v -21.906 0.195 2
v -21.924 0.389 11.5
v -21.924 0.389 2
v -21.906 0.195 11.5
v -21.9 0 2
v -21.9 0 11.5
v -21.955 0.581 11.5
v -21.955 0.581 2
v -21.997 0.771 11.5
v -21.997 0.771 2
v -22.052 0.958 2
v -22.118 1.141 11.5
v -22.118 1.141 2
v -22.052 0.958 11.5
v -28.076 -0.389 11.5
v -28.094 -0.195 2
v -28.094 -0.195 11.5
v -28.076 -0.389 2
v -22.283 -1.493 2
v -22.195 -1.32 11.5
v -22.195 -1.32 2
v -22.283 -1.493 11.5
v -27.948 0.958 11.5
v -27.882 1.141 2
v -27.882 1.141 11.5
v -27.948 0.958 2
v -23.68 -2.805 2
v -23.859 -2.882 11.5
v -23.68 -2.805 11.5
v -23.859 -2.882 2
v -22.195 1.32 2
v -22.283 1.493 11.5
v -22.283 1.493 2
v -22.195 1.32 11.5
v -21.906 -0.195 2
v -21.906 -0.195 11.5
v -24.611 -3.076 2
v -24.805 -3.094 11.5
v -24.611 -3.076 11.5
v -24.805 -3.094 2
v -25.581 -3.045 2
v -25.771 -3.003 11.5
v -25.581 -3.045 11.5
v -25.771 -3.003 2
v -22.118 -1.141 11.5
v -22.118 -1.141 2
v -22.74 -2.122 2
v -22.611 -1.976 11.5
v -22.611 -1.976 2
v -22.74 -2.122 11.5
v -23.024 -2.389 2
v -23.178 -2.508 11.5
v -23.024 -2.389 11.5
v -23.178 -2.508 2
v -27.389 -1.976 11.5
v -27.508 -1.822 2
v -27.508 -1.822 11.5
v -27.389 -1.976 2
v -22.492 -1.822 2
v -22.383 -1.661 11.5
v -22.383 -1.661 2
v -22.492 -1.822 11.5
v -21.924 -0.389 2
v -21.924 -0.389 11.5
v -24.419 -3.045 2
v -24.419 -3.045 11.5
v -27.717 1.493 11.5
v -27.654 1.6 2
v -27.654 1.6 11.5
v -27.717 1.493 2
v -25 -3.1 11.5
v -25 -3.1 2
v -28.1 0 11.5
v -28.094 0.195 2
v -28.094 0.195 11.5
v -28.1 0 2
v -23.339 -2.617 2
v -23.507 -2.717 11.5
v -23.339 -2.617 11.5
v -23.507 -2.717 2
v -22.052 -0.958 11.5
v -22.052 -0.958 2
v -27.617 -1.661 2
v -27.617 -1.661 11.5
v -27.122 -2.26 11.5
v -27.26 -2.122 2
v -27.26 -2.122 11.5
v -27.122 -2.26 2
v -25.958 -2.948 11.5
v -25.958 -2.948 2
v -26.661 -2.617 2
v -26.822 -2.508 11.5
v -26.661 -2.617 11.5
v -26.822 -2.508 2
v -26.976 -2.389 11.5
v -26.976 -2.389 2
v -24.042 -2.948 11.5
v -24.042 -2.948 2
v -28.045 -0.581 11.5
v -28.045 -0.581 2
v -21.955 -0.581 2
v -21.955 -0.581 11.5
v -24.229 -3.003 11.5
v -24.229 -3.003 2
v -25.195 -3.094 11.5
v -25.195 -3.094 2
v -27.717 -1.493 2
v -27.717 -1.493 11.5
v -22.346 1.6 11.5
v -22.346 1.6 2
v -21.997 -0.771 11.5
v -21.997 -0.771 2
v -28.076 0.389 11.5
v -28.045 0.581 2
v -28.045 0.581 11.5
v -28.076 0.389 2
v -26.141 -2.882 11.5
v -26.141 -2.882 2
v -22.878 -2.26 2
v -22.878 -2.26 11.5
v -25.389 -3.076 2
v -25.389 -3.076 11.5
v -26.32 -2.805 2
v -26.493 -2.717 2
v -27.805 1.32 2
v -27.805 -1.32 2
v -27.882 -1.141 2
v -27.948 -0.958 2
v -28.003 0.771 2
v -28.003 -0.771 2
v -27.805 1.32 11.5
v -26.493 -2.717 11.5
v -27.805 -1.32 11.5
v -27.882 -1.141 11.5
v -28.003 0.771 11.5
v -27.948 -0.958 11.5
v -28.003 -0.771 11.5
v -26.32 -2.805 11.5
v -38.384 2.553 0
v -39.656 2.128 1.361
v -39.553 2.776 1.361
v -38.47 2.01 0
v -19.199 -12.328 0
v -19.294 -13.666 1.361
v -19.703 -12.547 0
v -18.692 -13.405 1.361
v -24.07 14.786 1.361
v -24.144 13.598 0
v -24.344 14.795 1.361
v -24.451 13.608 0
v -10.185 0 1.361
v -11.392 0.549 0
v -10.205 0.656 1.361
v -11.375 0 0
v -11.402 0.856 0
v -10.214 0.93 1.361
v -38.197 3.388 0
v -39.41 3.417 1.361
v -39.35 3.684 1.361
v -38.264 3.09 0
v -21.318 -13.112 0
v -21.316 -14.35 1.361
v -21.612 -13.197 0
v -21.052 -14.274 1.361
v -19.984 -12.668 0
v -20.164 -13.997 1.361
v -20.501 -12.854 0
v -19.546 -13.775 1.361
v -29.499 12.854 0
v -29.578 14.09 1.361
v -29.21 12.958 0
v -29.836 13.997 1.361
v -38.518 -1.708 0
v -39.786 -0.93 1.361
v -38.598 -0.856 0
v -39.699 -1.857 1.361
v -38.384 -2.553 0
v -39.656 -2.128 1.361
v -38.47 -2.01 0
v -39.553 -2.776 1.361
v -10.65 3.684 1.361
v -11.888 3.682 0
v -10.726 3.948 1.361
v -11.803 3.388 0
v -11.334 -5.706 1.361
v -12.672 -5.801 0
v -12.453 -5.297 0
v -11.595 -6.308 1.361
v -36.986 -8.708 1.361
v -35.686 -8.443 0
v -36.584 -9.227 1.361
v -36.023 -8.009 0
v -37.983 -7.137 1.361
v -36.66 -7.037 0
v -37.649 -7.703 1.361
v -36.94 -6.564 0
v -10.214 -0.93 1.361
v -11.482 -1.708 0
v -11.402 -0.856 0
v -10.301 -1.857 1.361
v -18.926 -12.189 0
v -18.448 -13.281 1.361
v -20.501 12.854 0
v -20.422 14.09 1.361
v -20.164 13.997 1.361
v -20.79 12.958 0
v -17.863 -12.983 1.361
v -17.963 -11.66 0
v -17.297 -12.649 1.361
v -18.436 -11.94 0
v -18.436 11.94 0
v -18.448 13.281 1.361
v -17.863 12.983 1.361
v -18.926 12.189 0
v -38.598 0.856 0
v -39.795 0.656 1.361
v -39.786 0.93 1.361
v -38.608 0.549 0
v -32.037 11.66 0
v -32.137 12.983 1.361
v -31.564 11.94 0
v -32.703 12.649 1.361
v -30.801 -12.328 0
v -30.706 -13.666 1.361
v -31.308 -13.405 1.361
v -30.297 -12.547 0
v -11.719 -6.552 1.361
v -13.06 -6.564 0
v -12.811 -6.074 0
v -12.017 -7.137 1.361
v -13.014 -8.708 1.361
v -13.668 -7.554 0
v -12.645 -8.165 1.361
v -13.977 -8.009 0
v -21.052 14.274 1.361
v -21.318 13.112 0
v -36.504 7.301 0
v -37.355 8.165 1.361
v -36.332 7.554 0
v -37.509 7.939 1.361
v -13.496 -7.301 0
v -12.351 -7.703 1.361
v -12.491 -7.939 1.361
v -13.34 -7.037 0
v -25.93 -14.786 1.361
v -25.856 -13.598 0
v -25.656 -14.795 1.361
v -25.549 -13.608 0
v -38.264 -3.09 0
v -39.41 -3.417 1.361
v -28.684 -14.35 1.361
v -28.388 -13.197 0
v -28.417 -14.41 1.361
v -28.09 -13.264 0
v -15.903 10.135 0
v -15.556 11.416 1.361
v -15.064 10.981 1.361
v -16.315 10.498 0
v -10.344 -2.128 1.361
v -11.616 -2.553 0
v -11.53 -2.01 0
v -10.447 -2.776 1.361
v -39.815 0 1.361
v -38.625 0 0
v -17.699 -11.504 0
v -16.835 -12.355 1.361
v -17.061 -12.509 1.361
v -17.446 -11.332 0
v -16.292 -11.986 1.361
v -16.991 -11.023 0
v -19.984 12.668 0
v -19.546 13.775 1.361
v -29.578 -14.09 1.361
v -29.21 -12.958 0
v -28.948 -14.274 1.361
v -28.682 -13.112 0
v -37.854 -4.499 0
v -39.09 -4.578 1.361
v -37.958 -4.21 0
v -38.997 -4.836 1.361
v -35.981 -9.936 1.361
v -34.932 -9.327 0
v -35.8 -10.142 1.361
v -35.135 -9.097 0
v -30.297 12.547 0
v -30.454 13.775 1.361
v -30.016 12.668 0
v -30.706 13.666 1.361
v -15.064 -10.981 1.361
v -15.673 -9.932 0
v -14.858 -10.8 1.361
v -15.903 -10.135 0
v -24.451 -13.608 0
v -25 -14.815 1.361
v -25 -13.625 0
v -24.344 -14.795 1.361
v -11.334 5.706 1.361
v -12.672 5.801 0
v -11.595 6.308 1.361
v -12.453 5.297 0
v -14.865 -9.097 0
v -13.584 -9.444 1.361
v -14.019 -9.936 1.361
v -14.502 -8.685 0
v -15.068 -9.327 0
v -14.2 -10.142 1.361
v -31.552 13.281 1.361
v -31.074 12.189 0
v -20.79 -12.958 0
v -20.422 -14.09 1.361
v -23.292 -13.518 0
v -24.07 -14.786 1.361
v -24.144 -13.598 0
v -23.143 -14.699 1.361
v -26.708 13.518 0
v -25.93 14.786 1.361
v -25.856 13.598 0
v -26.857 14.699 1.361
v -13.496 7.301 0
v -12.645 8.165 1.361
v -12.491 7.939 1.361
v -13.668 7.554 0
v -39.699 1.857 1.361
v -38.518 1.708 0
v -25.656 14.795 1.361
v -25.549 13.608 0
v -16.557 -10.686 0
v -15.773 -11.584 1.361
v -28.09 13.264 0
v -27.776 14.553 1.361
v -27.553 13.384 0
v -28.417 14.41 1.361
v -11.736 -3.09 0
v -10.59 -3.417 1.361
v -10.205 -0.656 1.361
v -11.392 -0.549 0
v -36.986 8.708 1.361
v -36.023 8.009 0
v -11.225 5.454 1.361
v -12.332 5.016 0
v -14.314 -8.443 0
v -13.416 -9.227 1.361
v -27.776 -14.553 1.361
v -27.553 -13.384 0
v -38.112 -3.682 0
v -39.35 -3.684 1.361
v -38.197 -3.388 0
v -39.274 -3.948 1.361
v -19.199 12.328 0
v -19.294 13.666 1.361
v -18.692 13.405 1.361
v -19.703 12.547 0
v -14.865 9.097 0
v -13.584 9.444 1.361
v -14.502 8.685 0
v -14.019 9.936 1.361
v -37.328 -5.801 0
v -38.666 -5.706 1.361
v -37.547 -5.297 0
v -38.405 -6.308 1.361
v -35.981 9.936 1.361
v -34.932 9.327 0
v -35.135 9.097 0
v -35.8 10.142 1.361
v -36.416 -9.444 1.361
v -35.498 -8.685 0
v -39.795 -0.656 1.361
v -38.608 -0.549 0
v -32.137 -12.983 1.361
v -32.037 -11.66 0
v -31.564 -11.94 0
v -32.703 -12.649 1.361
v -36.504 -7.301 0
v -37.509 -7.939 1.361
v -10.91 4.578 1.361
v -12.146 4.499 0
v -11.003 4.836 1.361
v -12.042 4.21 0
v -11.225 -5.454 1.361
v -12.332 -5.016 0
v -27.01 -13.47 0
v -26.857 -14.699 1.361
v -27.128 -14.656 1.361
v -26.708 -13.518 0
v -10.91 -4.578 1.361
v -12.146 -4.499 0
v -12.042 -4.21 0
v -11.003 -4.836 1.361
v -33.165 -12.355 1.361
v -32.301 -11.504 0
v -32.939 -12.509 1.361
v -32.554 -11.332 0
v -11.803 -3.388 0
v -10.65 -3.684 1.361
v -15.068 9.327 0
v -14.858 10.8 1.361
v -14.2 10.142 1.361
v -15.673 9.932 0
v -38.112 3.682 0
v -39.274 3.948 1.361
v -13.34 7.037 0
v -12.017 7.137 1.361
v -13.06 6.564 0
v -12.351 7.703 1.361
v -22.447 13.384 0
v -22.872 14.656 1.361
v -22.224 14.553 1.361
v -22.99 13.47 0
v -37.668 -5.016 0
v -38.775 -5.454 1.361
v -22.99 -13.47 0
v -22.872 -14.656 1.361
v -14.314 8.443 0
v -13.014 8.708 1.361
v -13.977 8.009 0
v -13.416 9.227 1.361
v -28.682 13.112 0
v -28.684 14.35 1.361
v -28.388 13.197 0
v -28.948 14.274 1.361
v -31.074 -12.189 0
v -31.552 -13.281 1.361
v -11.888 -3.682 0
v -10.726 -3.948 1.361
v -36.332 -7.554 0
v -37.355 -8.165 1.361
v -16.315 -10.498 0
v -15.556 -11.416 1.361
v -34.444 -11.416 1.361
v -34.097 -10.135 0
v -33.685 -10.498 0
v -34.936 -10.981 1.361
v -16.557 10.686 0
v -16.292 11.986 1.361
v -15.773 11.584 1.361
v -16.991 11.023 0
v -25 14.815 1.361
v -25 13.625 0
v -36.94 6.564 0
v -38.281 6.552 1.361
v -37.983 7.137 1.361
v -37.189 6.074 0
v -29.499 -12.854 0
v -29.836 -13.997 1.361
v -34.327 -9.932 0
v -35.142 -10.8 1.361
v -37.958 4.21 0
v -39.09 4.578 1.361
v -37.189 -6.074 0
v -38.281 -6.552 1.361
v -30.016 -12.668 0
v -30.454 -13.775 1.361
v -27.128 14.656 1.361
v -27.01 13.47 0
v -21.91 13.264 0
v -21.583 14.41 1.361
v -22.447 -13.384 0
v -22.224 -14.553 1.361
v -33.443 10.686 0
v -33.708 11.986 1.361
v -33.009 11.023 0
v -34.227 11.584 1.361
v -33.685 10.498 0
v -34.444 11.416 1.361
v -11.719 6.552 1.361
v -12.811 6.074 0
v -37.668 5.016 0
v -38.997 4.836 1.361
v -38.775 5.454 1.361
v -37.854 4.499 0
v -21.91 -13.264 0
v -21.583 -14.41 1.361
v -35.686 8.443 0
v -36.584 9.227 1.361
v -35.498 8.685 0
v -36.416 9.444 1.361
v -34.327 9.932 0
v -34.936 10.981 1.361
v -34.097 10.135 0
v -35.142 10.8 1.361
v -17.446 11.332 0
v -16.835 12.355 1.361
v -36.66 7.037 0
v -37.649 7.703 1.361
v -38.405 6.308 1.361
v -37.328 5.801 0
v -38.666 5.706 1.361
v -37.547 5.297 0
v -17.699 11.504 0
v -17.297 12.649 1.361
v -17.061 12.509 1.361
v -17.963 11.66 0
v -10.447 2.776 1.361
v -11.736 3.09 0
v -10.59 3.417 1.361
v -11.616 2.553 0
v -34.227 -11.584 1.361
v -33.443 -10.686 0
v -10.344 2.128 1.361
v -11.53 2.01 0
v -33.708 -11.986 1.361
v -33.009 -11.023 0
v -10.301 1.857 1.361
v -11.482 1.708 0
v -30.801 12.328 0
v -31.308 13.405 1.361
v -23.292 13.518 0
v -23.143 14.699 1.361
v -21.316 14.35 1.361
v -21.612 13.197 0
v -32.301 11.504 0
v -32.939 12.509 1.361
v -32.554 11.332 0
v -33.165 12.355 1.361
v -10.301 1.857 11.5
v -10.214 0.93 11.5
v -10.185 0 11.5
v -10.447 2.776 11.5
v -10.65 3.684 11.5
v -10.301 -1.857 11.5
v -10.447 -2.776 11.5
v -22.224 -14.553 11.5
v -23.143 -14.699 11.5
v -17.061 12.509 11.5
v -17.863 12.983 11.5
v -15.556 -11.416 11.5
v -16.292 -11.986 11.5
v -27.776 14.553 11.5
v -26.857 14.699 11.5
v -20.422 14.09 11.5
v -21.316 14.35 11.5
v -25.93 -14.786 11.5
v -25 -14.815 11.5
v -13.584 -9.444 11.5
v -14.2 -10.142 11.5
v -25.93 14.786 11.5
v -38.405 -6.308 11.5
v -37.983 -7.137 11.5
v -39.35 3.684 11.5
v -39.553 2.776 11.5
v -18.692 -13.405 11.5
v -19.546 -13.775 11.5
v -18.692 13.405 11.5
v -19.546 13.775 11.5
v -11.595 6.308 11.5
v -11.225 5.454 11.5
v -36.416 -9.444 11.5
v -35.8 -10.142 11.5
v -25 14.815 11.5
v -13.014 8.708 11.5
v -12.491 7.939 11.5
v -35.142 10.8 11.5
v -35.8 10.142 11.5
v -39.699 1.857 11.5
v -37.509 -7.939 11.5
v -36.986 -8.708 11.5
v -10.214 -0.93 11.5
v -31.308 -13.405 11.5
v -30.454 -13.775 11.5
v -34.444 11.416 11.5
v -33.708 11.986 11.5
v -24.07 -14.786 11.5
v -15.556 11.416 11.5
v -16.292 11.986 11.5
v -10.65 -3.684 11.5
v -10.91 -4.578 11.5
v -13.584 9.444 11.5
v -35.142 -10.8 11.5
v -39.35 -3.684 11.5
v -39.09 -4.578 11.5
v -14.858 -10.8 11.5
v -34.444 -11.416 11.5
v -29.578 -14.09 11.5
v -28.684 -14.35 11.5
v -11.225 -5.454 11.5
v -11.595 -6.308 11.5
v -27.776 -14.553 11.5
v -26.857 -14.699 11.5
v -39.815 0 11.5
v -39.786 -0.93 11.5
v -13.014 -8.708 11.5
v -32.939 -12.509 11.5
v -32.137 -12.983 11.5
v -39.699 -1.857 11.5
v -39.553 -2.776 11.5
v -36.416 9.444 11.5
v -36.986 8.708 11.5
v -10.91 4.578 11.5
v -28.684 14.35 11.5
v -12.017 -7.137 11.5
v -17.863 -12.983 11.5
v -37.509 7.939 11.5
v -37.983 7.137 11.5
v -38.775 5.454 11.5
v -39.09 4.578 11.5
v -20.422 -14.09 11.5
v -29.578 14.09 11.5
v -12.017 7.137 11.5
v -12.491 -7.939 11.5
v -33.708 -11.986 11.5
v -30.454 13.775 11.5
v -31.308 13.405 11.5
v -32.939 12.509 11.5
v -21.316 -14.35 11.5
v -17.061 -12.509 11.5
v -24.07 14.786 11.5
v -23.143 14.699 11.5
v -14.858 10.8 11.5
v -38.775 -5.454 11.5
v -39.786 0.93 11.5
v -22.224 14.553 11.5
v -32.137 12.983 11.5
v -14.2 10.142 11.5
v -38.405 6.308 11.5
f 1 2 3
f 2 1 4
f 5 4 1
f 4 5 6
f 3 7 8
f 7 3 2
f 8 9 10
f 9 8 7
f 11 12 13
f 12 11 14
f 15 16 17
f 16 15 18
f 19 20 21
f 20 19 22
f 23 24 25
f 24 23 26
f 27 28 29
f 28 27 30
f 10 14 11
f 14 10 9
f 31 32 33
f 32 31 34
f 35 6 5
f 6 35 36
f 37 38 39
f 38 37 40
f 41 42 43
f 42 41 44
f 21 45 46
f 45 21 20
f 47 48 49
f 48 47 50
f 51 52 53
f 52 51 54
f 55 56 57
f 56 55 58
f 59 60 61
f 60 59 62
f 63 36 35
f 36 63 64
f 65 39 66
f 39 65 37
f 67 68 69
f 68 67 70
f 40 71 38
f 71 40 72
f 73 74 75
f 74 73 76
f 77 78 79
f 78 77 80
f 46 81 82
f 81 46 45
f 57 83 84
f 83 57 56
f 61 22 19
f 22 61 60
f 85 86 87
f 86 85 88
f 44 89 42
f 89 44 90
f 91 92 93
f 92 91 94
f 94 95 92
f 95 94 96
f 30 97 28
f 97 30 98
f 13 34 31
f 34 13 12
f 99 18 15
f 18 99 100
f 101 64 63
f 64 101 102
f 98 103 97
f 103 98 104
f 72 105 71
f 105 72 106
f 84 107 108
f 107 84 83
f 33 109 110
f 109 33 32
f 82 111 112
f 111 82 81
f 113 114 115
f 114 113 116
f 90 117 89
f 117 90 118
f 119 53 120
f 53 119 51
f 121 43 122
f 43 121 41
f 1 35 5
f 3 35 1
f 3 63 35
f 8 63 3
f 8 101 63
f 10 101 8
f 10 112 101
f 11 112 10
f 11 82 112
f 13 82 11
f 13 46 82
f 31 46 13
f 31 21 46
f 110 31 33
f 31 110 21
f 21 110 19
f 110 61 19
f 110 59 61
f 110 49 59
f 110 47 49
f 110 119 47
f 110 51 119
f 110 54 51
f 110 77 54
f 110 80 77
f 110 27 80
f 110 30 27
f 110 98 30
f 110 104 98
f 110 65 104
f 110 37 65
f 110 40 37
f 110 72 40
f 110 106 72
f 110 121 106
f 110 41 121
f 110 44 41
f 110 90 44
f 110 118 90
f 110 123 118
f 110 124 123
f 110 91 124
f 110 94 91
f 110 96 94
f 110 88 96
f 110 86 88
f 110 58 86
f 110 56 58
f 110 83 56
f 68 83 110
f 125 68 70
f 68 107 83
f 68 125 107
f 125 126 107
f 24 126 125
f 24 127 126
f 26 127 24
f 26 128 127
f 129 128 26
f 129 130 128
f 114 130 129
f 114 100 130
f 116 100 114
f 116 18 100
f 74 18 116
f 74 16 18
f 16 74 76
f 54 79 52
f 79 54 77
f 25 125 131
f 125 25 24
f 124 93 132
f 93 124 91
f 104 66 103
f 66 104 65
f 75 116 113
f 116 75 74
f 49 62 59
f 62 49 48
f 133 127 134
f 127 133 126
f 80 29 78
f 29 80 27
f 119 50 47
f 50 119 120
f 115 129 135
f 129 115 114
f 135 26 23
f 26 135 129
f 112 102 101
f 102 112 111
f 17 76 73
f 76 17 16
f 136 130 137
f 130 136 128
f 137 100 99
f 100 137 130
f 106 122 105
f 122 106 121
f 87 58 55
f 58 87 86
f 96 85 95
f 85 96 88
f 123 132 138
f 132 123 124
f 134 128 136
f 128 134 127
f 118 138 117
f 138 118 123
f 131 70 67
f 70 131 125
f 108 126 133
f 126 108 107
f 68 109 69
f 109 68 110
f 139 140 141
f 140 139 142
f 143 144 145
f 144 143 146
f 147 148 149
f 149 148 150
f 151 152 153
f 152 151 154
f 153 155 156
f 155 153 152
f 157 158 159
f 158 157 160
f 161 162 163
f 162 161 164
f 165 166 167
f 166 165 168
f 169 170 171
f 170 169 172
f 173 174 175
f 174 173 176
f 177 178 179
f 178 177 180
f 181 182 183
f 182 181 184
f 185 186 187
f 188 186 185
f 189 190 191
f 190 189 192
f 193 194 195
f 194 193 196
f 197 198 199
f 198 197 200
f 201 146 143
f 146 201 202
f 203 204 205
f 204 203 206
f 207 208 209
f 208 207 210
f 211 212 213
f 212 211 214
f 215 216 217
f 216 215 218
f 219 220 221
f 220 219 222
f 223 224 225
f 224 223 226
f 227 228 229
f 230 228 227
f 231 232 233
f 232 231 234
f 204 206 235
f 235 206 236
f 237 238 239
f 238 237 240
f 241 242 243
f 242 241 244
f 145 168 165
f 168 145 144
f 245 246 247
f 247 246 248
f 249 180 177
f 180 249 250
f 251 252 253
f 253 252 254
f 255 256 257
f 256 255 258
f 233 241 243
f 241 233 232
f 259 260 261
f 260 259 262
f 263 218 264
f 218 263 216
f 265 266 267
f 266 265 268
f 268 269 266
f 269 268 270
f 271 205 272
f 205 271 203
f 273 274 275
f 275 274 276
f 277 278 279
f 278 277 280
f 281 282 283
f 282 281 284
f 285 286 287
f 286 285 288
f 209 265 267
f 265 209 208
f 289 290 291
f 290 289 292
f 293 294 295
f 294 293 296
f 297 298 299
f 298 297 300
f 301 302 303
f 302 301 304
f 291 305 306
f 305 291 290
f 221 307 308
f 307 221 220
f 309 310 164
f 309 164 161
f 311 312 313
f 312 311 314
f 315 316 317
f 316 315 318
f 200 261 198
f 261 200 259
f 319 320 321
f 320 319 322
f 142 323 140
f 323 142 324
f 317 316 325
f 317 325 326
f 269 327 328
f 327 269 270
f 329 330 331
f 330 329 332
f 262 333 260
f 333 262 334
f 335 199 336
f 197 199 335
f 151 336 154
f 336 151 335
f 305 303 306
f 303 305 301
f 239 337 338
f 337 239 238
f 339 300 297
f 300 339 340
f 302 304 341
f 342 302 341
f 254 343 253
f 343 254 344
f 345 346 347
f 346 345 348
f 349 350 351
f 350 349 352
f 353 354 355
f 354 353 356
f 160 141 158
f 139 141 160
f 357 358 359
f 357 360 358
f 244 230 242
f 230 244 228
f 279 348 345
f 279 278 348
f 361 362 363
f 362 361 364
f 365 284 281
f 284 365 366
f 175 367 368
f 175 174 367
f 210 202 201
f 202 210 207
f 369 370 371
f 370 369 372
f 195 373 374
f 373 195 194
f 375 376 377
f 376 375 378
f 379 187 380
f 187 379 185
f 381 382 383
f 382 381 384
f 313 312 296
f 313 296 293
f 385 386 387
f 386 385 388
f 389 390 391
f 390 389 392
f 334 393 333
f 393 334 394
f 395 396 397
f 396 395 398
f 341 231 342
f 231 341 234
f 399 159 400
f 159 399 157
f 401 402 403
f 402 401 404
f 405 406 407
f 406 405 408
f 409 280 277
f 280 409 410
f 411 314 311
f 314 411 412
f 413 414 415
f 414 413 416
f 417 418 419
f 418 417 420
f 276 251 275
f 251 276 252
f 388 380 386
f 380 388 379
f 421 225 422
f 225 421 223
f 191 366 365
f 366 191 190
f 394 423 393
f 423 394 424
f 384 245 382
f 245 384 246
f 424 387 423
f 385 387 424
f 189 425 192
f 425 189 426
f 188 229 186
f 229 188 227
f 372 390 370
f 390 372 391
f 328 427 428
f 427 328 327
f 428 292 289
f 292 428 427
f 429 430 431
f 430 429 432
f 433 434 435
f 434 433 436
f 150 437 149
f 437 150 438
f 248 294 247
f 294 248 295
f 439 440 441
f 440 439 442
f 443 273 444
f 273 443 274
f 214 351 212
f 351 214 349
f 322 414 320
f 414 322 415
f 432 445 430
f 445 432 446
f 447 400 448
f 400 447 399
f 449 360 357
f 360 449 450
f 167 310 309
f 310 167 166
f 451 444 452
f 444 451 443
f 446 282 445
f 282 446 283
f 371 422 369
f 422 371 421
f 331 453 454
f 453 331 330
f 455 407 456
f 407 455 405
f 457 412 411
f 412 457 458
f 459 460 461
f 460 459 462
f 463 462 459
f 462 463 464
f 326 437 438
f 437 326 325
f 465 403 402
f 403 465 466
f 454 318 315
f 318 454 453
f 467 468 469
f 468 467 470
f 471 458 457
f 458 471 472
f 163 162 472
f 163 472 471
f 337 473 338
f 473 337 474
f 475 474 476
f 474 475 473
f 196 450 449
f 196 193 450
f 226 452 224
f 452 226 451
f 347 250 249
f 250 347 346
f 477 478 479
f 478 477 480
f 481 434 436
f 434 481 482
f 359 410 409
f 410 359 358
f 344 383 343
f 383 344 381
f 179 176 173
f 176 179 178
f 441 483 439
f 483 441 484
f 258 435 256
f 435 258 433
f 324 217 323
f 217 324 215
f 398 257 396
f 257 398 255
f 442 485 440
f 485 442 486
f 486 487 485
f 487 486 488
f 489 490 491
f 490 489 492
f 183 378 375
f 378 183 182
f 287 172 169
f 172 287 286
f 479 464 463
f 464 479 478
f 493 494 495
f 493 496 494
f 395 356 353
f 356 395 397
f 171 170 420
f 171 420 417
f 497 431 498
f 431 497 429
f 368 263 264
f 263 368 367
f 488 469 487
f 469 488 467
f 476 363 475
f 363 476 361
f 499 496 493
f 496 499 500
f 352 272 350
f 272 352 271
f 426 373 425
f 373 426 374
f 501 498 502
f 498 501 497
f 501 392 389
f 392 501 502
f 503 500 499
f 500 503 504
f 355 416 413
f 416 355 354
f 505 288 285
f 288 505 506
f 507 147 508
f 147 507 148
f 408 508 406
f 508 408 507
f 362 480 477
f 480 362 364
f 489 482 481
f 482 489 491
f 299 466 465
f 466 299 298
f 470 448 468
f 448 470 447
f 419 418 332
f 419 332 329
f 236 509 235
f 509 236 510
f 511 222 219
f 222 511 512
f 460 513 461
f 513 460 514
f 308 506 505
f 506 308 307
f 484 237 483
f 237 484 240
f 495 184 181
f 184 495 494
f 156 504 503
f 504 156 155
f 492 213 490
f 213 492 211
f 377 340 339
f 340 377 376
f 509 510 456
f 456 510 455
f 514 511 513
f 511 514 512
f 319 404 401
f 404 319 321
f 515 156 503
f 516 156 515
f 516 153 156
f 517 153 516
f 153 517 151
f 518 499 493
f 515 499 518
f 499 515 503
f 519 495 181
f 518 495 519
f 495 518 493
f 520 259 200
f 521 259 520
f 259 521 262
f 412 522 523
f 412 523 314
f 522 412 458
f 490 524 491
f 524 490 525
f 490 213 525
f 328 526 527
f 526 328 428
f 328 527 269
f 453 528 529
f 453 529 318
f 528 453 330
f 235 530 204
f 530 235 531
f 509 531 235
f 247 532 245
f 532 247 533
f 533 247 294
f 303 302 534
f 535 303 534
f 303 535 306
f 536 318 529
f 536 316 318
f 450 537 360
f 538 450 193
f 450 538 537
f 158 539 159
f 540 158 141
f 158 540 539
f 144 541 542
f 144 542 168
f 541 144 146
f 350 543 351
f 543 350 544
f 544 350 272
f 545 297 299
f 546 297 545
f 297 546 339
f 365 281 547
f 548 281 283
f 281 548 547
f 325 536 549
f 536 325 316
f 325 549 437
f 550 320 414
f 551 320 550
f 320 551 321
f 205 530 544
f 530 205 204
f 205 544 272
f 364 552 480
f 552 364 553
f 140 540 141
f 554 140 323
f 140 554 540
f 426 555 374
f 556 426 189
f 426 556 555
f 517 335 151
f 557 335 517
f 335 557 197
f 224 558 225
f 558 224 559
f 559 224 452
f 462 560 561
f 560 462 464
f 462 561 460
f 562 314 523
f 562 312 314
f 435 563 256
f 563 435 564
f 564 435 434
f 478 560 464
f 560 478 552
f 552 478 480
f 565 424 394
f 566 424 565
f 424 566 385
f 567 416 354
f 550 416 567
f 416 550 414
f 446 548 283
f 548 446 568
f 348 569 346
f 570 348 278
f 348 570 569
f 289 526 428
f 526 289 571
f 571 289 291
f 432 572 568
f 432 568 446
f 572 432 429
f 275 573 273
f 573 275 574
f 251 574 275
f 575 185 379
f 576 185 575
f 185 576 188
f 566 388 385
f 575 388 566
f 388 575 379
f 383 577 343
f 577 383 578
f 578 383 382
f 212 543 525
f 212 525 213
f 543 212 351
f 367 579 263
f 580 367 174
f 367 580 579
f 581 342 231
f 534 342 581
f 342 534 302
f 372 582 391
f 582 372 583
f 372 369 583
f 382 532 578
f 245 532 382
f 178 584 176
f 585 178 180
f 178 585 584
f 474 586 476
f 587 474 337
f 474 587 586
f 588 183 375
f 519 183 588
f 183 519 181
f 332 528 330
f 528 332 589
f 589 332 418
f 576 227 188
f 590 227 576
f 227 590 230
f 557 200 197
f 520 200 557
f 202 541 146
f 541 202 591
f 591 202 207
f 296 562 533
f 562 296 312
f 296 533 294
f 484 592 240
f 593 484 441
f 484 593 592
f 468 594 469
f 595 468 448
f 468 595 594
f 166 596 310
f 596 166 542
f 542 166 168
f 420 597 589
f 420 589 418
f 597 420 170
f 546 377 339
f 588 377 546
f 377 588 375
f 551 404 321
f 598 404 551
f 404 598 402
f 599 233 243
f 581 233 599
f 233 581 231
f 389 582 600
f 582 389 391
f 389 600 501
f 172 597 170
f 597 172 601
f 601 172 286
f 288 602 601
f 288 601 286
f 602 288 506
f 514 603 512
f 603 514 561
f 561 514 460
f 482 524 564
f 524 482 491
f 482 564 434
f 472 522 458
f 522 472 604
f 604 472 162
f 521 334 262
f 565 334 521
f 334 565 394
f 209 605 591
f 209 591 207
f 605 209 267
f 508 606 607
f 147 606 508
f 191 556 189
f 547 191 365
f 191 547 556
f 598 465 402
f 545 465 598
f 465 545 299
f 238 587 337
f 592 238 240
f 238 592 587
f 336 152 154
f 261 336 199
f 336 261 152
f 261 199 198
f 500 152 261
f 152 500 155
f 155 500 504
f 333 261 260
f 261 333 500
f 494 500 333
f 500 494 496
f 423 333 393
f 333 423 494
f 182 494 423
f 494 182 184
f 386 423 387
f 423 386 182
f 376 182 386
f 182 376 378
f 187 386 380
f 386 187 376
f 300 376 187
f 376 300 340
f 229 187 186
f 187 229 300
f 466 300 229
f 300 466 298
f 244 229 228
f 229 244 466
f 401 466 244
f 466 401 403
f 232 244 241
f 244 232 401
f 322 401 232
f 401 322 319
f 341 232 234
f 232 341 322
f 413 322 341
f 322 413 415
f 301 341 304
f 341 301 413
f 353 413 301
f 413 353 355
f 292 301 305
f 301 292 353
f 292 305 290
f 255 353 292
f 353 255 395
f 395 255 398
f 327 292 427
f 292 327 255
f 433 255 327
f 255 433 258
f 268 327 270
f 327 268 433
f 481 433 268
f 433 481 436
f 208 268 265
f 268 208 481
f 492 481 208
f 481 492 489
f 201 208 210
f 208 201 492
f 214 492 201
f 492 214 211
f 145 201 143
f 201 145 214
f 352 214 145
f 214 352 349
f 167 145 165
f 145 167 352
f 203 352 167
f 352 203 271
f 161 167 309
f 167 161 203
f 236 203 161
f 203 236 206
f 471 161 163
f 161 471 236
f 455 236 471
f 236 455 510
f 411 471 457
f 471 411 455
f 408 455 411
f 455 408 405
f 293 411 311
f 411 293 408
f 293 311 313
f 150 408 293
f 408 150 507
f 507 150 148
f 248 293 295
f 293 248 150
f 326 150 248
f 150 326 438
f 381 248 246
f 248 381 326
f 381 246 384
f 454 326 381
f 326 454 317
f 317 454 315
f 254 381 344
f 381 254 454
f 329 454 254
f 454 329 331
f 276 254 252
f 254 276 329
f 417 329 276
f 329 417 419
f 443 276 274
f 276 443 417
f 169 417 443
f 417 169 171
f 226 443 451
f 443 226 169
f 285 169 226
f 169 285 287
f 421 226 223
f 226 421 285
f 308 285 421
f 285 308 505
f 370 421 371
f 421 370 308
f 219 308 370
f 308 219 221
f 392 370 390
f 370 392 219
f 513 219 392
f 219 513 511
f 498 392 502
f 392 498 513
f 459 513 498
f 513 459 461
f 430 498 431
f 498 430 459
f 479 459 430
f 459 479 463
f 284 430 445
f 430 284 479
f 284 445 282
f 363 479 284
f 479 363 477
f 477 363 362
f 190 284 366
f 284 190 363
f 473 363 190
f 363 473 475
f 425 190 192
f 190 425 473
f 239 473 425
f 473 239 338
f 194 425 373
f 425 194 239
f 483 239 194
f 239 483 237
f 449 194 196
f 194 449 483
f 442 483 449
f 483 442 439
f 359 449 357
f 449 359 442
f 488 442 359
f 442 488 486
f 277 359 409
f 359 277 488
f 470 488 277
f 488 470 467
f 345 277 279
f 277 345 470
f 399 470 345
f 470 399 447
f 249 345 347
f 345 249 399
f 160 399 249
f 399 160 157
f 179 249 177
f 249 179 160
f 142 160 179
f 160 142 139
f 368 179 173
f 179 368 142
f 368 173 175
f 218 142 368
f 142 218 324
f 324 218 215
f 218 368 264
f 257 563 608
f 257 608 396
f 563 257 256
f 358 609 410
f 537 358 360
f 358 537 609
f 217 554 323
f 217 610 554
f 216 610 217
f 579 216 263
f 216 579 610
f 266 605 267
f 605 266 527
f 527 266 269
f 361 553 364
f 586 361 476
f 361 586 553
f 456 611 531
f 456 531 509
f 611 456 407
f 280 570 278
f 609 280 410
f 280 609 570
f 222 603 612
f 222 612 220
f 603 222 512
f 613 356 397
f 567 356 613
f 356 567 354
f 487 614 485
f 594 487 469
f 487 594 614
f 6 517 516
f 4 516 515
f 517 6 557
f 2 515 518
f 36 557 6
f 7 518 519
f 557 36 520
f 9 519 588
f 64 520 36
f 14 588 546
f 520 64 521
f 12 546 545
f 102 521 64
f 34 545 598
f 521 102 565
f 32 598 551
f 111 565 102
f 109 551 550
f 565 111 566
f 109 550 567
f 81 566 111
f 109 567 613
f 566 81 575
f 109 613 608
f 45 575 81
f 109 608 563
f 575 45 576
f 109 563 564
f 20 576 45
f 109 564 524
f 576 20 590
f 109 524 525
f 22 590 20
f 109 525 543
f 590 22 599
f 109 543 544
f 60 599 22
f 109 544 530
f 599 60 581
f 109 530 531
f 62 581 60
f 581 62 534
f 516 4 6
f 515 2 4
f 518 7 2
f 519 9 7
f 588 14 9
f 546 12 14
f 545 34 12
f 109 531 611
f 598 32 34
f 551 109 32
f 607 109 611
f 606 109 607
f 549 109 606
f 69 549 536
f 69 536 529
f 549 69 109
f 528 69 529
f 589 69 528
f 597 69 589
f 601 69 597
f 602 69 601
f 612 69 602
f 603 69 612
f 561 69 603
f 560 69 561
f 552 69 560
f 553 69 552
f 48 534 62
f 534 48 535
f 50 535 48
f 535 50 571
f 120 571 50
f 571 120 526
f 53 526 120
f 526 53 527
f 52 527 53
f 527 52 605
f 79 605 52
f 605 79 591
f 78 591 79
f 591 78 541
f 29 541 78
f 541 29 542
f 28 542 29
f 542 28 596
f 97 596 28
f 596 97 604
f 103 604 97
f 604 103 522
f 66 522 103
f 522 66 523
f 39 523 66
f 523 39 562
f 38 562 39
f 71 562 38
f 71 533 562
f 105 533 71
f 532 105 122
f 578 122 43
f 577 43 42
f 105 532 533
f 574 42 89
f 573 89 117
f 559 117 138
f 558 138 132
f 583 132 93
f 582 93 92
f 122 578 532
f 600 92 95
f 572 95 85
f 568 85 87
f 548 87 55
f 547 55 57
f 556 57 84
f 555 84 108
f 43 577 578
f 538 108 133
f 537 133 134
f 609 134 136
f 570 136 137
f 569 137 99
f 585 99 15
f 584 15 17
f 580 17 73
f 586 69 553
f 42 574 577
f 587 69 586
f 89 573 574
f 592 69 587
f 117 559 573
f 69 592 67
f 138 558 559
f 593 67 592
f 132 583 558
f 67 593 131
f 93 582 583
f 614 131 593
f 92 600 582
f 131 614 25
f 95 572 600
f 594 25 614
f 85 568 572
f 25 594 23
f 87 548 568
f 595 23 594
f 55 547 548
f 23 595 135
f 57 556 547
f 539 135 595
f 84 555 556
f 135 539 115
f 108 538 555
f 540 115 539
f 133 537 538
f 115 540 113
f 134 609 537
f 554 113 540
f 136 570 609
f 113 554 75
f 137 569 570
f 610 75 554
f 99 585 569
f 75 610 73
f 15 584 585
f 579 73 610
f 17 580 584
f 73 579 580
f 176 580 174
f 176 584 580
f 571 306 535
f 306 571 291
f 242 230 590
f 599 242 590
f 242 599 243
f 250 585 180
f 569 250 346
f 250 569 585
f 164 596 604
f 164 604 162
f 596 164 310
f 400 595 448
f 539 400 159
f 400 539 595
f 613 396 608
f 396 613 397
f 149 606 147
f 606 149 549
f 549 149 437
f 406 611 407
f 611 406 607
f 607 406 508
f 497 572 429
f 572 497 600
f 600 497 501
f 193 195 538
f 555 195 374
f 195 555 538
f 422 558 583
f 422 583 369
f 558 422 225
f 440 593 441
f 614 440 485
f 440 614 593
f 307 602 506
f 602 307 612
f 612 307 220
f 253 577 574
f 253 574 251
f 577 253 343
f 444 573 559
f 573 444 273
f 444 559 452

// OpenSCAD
$fn = 100;

external_diameter = 29.631;
internal_diameter = 26.9;
nut_recess_internal_diameter = 15;
nut_recess_external_diameter = 18;
nut_recess_internal_height = 8;
nut_recess_external_height = 9;
hole_diameter = 7.2;
top_height = 1;
bottom_height = 3;
bottom_plate_thickness = 2;

knob_diameter = external_diameter;
knob_shaft_length = 9.5;
knob_shaft_diameter = 6.2;
knob_thickness_above_shaft = 2;
knob_height = knob_thickness_above_shaft + knob_shaft_length;
height_of_knob_shaft_flat_part = 1.6;

bevel_height = 20;
bevel_outer_diameter = 50;
bevel_inner_diameter = 15;
bevel_offset = 7;

translate([-25,0,0]) knob();
//translate([25,0,0]) knob_plug();
//plug_bottom_plate();

module knob() {
    difference() {
        knob_exterior();
        knob_shaft_hole();
        knob_bevel();
    }   
}

module knob_bevel() {
    translate([0,0,-bevel_offset])
    difference() {
        cylinder(h = bevel_height-2,
            d2 = bevel_outer_diameter+10,
            d1 = bevel_inner_diameter+10);
        cylinder(h = bevel_height,
            d2 = bevel_outer_diameter,
            d1 = bevel_inner_diameter);
    }
}

module knob_exterior() {
    cylinder(h = knob_height, d = knob_diameter);
}


module knob_shaft_hole() {
    knob_shaft_hole_length = knob_shaft_length + 1;
    translate([0,0,knob_thickness_above_shaft])
        difference() {
            cylinder(h = knob_shaft_hole_length, d = knob_shaft_diameter);
            translate([-external_diameter/2,height_of_knob_shaft_flat_part,0])
                cube([external_diameter, external_diameter, knob_height+1]);
        }
}

module knob_plug() {
    difference() {
        plug();
        hole();
    }
}

module plug() {
    cylinder(h=top_height, d=external_diameter);
    translate([0, 0, top_height]) cylinder(h=bottom_height, d=internal_diameter);
    cylinder(h = top_height + nut_recess_internal_height, d = nut_recess_external_diameter);
}

module hole() {
    translate([0, 0, -1])
        cylinder(h=top_height + nut_recess_external_height + 2, d=nut_recess_internal_diameter);
}

module plug_bottom_plate() {
    difference() {
        plug_bottom_plate_exterior();
        plug_bottom_plate_hole();
    }
}

module plug_bottom_plate_exterior() {
    cylinder(h = nut_recess_external_height - nut_recess_internal_height, d = nut_recess_external_diameter);
    translate([0,0,nut_recess_external_height - nut_recess_internal_height]) cylinder(h = bottom_plate_thickness, d = nut_recess_internal_diameter);
}

module plug_bottom_plate_hole() {
    translate([0,0,-1])
        cylinder(h = nut_recess_external_height + 2, d = hole_diameter);
}
